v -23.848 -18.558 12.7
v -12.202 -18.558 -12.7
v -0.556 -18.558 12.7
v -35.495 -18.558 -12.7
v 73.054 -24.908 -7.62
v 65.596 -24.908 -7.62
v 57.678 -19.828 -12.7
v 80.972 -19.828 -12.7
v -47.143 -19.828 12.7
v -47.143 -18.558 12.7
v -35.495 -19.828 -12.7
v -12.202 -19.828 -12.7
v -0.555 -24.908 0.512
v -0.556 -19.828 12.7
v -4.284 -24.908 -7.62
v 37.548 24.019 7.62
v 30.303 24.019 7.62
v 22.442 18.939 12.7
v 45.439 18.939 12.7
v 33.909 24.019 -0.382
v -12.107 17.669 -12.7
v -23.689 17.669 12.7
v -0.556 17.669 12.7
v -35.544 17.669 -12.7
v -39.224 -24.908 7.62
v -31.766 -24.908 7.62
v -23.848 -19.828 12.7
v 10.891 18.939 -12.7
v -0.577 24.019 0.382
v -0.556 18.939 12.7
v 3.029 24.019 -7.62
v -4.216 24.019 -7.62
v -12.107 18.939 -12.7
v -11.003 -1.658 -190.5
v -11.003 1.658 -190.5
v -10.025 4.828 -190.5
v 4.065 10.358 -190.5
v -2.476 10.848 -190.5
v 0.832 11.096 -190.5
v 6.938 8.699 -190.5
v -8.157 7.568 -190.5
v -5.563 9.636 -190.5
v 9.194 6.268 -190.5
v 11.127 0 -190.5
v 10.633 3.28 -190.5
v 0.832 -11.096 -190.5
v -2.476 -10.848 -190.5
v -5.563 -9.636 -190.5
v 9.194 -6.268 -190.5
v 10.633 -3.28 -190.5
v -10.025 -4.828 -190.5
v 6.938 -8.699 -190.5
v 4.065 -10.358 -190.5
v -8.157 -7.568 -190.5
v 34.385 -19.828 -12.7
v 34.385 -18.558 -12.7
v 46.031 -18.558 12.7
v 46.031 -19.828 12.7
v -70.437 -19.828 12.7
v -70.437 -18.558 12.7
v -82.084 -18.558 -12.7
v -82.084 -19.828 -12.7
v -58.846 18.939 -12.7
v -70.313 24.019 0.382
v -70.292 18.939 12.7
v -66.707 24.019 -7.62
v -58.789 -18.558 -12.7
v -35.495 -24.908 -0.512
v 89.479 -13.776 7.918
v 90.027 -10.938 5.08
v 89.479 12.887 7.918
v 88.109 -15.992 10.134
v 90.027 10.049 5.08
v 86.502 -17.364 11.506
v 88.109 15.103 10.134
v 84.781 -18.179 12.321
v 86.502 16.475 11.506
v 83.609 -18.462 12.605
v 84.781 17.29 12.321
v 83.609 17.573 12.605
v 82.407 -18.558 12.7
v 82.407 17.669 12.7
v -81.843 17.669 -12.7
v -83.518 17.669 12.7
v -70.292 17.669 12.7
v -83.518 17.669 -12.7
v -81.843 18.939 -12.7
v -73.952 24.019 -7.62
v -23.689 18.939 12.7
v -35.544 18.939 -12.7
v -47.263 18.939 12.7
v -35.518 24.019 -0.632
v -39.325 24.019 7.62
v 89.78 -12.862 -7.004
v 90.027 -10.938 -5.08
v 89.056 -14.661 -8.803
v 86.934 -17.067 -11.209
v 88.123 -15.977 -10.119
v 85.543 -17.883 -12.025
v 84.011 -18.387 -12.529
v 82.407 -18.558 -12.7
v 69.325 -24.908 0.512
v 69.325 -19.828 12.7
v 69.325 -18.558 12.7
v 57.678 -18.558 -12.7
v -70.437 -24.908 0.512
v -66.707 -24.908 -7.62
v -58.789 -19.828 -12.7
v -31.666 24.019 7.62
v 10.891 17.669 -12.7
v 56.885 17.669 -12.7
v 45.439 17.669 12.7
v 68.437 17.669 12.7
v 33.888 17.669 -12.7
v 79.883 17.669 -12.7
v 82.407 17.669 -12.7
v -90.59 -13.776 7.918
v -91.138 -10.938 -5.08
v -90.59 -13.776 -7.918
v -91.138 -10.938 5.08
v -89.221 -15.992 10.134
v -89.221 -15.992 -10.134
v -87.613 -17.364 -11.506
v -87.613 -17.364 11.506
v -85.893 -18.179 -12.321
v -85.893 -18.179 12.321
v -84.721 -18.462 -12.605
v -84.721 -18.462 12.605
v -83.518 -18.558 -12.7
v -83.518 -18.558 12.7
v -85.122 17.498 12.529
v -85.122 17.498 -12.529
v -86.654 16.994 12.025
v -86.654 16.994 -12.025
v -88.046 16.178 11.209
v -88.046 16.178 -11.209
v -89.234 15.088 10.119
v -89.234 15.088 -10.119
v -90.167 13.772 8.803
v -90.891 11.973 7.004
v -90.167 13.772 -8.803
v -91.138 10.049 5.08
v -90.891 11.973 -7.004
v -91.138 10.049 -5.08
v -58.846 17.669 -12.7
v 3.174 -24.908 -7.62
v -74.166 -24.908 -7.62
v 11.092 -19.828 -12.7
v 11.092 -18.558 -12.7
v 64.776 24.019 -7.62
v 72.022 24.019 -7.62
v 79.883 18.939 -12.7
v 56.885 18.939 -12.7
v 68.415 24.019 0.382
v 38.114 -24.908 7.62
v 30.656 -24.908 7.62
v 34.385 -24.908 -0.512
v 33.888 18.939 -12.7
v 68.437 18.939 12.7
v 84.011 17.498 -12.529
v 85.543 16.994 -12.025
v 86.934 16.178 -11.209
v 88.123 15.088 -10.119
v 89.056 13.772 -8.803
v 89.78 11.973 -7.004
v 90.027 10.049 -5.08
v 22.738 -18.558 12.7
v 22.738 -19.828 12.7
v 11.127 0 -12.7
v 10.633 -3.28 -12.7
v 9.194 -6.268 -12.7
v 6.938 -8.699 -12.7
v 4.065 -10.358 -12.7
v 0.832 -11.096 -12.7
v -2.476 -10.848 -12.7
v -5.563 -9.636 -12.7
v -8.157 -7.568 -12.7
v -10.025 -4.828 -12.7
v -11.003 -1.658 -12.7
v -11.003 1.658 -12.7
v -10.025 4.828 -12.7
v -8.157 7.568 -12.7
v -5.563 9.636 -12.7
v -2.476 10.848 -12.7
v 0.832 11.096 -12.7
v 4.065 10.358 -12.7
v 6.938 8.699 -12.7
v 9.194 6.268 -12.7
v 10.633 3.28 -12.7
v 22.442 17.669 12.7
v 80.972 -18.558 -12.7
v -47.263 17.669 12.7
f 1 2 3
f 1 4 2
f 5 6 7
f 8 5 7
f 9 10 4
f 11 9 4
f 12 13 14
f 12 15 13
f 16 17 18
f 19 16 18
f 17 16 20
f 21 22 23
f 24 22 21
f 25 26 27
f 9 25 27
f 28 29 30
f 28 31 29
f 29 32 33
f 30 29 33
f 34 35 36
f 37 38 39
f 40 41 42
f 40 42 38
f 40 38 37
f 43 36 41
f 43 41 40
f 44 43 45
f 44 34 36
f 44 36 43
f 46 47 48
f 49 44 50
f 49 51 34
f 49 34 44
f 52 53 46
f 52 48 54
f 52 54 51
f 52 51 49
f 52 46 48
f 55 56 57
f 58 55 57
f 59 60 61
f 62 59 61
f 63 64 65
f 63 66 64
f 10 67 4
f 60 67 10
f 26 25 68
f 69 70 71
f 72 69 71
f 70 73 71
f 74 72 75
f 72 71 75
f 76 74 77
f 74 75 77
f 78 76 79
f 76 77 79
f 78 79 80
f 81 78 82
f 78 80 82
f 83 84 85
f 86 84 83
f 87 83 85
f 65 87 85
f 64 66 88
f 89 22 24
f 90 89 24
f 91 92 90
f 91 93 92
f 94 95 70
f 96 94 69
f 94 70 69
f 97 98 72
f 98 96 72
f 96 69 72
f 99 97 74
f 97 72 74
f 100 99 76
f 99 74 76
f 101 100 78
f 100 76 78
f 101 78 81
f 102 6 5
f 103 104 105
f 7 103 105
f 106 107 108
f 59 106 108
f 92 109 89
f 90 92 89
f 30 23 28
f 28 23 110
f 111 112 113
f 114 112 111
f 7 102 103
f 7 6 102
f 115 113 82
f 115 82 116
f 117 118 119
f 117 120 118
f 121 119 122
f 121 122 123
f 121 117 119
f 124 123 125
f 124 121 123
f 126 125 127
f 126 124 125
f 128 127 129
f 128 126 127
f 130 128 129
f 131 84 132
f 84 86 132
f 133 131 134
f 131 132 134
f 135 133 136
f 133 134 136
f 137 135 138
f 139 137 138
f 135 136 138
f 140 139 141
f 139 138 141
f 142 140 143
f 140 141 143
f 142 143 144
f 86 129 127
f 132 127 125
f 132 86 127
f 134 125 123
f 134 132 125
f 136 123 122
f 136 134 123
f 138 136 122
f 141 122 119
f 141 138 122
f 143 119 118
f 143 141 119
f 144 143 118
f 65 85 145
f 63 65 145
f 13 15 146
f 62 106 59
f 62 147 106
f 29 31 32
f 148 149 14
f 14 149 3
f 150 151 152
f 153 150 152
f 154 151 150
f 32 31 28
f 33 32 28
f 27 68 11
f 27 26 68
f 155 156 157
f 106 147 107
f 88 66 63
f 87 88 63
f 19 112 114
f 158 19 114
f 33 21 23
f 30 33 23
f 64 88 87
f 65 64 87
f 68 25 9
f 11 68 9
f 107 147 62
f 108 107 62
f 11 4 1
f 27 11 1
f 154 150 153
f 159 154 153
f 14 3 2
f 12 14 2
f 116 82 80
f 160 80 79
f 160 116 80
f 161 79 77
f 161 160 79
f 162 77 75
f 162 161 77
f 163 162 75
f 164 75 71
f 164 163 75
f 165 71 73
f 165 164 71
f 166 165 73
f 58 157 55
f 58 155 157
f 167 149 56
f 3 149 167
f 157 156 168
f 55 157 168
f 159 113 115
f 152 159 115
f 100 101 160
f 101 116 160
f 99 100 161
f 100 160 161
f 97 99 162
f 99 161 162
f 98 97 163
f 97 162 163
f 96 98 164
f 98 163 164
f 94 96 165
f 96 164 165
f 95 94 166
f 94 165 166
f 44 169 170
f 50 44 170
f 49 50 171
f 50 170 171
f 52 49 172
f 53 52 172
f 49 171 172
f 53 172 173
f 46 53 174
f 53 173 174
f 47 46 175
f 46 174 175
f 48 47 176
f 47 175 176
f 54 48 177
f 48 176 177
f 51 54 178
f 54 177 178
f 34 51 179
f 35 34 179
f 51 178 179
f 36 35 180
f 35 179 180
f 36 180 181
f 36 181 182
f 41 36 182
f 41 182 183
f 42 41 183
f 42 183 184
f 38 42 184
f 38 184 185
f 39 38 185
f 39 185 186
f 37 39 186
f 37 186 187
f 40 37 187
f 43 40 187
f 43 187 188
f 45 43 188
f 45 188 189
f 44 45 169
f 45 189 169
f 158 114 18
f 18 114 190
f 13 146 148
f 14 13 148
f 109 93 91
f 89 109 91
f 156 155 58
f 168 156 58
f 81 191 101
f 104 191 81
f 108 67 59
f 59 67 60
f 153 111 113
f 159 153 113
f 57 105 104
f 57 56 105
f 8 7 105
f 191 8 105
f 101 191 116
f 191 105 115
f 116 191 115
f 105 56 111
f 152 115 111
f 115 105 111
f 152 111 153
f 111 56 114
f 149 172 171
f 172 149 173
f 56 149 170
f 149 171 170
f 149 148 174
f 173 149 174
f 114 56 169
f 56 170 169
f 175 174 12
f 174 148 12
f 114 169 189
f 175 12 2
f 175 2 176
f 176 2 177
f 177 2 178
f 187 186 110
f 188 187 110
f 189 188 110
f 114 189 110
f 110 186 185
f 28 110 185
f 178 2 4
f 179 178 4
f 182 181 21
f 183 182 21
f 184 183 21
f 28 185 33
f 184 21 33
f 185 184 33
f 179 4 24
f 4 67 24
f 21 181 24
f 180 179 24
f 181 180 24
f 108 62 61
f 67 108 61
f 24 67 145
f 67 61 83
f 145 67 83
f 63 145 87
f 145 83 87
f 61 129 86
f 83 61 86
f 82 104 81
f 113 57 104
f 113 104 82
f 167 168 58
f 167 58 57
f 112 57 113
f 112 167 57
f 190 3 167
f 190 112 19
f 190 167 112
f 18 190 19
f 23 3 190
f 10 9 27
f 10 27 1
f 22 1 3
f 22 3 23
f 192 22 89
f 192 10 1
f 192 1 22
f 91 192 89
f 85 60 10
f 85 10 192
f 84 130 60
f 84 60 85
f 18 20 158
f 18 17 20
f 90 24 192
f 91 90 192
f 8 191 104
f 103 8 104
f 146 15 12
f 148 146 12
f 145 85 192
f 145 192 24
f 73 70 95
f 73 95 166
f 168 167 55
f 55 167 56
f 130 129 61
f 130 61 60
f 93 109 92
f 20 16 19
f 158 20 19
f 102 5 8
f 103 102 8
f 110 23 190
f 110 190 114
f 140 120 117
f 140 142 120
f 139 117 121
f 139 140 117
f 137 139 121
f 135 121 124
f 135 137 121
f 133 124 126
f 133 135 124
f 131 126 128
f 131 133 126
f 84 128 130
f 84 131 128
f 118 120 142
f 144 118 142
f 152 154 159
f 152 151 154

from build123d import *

# Parameters (mm, degrees)
F0_W      = 79.5655027032
F0_H      = 36.2267494202
F1_DEPTH  = 12.7
F2_DEPTH  = 12.7
F3_R      = 11.1269376105
F4_DEPTH  = 177.8
F7_DEPTH  = 50.8
F8_DEPTH  = 50.8
F11_DEPTH = 6.35
F12_SIZE  = 5.08
F13_DEPTH = 6.35
F14_SIZE  = 5.08
F15_R     = 7.62
F16_R     = 7.62


with BuildPart() as f1:
    # F0 (on Top) → F1 (new body)
    with BuildSketch(Plane.XY):
        with Locations((-0.5556233227, -0.4444997758)):
            Rectangle(F0_W, F0_H)
    extrude(amount=F1_DEPTH)

    # F2 (add): a face of the model
    f2_faces = [f1.faces().sort_by_distance(p)[0] for p in [
        (-0.5556233227, -0.4444997758, 0),
    ]]
    extrude(f2_faces, amount=F2_DEPTH)

    # F3 (on face) → F4 (join)
    with BuildSketch(Plane(origin=(0, 0, -12.7), x_dir=(1, 0, 0), z_dir=(0, 0, -1))):
        Circle(F3_R)
    extrude(amount=F4_DEPTH)

    # F7 (add): a face of the model
    f7_faces = [f1.faces().sort_by_distance(p)[0] for p in [
        (-40.3383746743, -0.4444997758, 0),
    ]]
    extrude(f7_faces, amount=F7_DEPTH)

    # F8 (add): a face of the model
    f8_faces = [f1.faces().sort_by_distance(p)[0] for p in [
        (39.2271280289, -0.4444997758, 0),
    ]]
    extrude(f8_faces, amount=F8_DEPTH)

    # F9 (on face) → F11 (join)
    with BuildSketch(Plane.XZ.offset(18.5578744859)):
        Polygon((11.0919512808, -12.7), (-0.5556233227, 12.7), (-12.2015299276, -12.7), align=None)
        Polygon((46.031339094, 12.7), (22.7378578857, 12.7), (34.3854324892, -12.7), align=None)
        Polygon((69.3248221651, 12.7), (57.6780801639, -12.7), (80.9723967686, -12.7), align=None)
        Polygon((-35.4950129986, -12.7), (-23.8482709974, 12.7), (-47.1425876021, 12.7), align=None)
        Polygon((-82.083646208, -12.7), (-58.7893296033, -12.7), (-70.4369042069, 12.7), align=None)
    extrude(amount=F11_DEPTH)

    # F12
    f12_edges = [f1.edges().sort_by_distance(p)[0] for p in [
        (-70.436488, -24.907874, -12.7),
        (-64.613117, -24.907874, 0),
        (-76.260275, -24.907874, 0),
        (-41.3188, -24.907874, 0),
        (-29.671642, -24.907874, 0),
        (-35.495429, -24.907874, 12.7),
        (5.268164, -24.907874, 0),
        (-6.378577, -24.907874, 0),
        (-0.554789, -24.907874, -12.7),
        (34.384598, -24.907874, 12.7),
        (28.561645, -24.907874, 0),
        (40.208386, -24.907874, 0),
        (75.148609, -24.907874, 0),
        (63.501451, -24.907874, 0),
        (69.325238, -24.907874, -12.7),
    ]]
    chamfer(f12_edges, length=F12_SIZE)

    # F10 (on face) → F13 (join)
    with BuildSketch(Plane(origin=(0, 17.6688749343, 0), x_dir=(-1, 0, 0), z_dir=(0, 1, 0))):
        Polygon((12.1067352593, -12.7), (0.5556233227, 12.7), (-10.8906552196, -12.7), align=None)
        Polygon((47.2631566226, 12.7), (23.6892774701, 12.7), (35.5443507433, -12.7), align=None)
        Polygon((70.291981101, 12.7), (58.8457025588, -12.7), (81.8430930376, -12.7), align=None)
        Polygon((-33.8880456984, -12.7), (-22.4417671561, 12.7), (-45.439157635, 12.7), align=None)
        Polygon((-79.8828266561, -12.7), (-56.8854361773, -12.7), (-68.4365481138, 12.7), align=None)
    extrude(amount=F13_DEPTH)

    # F14
    f14_edges = [f1.edges().sort_by_distance(p)[0] for p in [
        (68.384131, 24.018875, -12.7),
        (62.660992, 24.018875, 0),
        (74.159687, 24.018875, 0),
        (28.164906, 24.018875, 0),
        (33.940462, 24.018875, 12.7),
        (39.663602, 24.018875, 0),
        (-0.60804, 24.018875, -12.7),
        (-6.331179, 24.018875, 0),
        (5.167516, 24.018875, 0),
        (-35.476217, 24.018875, 12.7),
        (-29.616814, 24.018875, 0),
        (-41.403754, 24.018875, 0),
        (-76.067537, 24.018875, 0),
        (-64.568842, 24.018875, 0),
        (-70.344398, 24.018875, -12.7),
    ]]
    chamfer(f14_edges, length=F14_SIZE)

    # F15
    f15_edges = [f1.edges().sort_by_distance(p)[0] for p in [
        (90.027128, -0.4445, 12.7),
        (90.027128, 17.668875, 0),
        (90.027128, -0.4445, -12.7),
        (90.027128, -18.557874, 0),
    ]]
    fillet(f15_edges, radius=F15_R)

    # F16
    f16_edges = [f1.edges().sort_by_distance(p)[0] for p in [
        (-91.138375, 17.668875, 0),
        (-91.138375, -0.4445, 12.7),
        (-91.138375, -18.557874, 0),
        (-91.138375, -0.4445, -12.7),
    ]]
    fillet(f16_edges, radius=F16_R)


solid = f1.part
